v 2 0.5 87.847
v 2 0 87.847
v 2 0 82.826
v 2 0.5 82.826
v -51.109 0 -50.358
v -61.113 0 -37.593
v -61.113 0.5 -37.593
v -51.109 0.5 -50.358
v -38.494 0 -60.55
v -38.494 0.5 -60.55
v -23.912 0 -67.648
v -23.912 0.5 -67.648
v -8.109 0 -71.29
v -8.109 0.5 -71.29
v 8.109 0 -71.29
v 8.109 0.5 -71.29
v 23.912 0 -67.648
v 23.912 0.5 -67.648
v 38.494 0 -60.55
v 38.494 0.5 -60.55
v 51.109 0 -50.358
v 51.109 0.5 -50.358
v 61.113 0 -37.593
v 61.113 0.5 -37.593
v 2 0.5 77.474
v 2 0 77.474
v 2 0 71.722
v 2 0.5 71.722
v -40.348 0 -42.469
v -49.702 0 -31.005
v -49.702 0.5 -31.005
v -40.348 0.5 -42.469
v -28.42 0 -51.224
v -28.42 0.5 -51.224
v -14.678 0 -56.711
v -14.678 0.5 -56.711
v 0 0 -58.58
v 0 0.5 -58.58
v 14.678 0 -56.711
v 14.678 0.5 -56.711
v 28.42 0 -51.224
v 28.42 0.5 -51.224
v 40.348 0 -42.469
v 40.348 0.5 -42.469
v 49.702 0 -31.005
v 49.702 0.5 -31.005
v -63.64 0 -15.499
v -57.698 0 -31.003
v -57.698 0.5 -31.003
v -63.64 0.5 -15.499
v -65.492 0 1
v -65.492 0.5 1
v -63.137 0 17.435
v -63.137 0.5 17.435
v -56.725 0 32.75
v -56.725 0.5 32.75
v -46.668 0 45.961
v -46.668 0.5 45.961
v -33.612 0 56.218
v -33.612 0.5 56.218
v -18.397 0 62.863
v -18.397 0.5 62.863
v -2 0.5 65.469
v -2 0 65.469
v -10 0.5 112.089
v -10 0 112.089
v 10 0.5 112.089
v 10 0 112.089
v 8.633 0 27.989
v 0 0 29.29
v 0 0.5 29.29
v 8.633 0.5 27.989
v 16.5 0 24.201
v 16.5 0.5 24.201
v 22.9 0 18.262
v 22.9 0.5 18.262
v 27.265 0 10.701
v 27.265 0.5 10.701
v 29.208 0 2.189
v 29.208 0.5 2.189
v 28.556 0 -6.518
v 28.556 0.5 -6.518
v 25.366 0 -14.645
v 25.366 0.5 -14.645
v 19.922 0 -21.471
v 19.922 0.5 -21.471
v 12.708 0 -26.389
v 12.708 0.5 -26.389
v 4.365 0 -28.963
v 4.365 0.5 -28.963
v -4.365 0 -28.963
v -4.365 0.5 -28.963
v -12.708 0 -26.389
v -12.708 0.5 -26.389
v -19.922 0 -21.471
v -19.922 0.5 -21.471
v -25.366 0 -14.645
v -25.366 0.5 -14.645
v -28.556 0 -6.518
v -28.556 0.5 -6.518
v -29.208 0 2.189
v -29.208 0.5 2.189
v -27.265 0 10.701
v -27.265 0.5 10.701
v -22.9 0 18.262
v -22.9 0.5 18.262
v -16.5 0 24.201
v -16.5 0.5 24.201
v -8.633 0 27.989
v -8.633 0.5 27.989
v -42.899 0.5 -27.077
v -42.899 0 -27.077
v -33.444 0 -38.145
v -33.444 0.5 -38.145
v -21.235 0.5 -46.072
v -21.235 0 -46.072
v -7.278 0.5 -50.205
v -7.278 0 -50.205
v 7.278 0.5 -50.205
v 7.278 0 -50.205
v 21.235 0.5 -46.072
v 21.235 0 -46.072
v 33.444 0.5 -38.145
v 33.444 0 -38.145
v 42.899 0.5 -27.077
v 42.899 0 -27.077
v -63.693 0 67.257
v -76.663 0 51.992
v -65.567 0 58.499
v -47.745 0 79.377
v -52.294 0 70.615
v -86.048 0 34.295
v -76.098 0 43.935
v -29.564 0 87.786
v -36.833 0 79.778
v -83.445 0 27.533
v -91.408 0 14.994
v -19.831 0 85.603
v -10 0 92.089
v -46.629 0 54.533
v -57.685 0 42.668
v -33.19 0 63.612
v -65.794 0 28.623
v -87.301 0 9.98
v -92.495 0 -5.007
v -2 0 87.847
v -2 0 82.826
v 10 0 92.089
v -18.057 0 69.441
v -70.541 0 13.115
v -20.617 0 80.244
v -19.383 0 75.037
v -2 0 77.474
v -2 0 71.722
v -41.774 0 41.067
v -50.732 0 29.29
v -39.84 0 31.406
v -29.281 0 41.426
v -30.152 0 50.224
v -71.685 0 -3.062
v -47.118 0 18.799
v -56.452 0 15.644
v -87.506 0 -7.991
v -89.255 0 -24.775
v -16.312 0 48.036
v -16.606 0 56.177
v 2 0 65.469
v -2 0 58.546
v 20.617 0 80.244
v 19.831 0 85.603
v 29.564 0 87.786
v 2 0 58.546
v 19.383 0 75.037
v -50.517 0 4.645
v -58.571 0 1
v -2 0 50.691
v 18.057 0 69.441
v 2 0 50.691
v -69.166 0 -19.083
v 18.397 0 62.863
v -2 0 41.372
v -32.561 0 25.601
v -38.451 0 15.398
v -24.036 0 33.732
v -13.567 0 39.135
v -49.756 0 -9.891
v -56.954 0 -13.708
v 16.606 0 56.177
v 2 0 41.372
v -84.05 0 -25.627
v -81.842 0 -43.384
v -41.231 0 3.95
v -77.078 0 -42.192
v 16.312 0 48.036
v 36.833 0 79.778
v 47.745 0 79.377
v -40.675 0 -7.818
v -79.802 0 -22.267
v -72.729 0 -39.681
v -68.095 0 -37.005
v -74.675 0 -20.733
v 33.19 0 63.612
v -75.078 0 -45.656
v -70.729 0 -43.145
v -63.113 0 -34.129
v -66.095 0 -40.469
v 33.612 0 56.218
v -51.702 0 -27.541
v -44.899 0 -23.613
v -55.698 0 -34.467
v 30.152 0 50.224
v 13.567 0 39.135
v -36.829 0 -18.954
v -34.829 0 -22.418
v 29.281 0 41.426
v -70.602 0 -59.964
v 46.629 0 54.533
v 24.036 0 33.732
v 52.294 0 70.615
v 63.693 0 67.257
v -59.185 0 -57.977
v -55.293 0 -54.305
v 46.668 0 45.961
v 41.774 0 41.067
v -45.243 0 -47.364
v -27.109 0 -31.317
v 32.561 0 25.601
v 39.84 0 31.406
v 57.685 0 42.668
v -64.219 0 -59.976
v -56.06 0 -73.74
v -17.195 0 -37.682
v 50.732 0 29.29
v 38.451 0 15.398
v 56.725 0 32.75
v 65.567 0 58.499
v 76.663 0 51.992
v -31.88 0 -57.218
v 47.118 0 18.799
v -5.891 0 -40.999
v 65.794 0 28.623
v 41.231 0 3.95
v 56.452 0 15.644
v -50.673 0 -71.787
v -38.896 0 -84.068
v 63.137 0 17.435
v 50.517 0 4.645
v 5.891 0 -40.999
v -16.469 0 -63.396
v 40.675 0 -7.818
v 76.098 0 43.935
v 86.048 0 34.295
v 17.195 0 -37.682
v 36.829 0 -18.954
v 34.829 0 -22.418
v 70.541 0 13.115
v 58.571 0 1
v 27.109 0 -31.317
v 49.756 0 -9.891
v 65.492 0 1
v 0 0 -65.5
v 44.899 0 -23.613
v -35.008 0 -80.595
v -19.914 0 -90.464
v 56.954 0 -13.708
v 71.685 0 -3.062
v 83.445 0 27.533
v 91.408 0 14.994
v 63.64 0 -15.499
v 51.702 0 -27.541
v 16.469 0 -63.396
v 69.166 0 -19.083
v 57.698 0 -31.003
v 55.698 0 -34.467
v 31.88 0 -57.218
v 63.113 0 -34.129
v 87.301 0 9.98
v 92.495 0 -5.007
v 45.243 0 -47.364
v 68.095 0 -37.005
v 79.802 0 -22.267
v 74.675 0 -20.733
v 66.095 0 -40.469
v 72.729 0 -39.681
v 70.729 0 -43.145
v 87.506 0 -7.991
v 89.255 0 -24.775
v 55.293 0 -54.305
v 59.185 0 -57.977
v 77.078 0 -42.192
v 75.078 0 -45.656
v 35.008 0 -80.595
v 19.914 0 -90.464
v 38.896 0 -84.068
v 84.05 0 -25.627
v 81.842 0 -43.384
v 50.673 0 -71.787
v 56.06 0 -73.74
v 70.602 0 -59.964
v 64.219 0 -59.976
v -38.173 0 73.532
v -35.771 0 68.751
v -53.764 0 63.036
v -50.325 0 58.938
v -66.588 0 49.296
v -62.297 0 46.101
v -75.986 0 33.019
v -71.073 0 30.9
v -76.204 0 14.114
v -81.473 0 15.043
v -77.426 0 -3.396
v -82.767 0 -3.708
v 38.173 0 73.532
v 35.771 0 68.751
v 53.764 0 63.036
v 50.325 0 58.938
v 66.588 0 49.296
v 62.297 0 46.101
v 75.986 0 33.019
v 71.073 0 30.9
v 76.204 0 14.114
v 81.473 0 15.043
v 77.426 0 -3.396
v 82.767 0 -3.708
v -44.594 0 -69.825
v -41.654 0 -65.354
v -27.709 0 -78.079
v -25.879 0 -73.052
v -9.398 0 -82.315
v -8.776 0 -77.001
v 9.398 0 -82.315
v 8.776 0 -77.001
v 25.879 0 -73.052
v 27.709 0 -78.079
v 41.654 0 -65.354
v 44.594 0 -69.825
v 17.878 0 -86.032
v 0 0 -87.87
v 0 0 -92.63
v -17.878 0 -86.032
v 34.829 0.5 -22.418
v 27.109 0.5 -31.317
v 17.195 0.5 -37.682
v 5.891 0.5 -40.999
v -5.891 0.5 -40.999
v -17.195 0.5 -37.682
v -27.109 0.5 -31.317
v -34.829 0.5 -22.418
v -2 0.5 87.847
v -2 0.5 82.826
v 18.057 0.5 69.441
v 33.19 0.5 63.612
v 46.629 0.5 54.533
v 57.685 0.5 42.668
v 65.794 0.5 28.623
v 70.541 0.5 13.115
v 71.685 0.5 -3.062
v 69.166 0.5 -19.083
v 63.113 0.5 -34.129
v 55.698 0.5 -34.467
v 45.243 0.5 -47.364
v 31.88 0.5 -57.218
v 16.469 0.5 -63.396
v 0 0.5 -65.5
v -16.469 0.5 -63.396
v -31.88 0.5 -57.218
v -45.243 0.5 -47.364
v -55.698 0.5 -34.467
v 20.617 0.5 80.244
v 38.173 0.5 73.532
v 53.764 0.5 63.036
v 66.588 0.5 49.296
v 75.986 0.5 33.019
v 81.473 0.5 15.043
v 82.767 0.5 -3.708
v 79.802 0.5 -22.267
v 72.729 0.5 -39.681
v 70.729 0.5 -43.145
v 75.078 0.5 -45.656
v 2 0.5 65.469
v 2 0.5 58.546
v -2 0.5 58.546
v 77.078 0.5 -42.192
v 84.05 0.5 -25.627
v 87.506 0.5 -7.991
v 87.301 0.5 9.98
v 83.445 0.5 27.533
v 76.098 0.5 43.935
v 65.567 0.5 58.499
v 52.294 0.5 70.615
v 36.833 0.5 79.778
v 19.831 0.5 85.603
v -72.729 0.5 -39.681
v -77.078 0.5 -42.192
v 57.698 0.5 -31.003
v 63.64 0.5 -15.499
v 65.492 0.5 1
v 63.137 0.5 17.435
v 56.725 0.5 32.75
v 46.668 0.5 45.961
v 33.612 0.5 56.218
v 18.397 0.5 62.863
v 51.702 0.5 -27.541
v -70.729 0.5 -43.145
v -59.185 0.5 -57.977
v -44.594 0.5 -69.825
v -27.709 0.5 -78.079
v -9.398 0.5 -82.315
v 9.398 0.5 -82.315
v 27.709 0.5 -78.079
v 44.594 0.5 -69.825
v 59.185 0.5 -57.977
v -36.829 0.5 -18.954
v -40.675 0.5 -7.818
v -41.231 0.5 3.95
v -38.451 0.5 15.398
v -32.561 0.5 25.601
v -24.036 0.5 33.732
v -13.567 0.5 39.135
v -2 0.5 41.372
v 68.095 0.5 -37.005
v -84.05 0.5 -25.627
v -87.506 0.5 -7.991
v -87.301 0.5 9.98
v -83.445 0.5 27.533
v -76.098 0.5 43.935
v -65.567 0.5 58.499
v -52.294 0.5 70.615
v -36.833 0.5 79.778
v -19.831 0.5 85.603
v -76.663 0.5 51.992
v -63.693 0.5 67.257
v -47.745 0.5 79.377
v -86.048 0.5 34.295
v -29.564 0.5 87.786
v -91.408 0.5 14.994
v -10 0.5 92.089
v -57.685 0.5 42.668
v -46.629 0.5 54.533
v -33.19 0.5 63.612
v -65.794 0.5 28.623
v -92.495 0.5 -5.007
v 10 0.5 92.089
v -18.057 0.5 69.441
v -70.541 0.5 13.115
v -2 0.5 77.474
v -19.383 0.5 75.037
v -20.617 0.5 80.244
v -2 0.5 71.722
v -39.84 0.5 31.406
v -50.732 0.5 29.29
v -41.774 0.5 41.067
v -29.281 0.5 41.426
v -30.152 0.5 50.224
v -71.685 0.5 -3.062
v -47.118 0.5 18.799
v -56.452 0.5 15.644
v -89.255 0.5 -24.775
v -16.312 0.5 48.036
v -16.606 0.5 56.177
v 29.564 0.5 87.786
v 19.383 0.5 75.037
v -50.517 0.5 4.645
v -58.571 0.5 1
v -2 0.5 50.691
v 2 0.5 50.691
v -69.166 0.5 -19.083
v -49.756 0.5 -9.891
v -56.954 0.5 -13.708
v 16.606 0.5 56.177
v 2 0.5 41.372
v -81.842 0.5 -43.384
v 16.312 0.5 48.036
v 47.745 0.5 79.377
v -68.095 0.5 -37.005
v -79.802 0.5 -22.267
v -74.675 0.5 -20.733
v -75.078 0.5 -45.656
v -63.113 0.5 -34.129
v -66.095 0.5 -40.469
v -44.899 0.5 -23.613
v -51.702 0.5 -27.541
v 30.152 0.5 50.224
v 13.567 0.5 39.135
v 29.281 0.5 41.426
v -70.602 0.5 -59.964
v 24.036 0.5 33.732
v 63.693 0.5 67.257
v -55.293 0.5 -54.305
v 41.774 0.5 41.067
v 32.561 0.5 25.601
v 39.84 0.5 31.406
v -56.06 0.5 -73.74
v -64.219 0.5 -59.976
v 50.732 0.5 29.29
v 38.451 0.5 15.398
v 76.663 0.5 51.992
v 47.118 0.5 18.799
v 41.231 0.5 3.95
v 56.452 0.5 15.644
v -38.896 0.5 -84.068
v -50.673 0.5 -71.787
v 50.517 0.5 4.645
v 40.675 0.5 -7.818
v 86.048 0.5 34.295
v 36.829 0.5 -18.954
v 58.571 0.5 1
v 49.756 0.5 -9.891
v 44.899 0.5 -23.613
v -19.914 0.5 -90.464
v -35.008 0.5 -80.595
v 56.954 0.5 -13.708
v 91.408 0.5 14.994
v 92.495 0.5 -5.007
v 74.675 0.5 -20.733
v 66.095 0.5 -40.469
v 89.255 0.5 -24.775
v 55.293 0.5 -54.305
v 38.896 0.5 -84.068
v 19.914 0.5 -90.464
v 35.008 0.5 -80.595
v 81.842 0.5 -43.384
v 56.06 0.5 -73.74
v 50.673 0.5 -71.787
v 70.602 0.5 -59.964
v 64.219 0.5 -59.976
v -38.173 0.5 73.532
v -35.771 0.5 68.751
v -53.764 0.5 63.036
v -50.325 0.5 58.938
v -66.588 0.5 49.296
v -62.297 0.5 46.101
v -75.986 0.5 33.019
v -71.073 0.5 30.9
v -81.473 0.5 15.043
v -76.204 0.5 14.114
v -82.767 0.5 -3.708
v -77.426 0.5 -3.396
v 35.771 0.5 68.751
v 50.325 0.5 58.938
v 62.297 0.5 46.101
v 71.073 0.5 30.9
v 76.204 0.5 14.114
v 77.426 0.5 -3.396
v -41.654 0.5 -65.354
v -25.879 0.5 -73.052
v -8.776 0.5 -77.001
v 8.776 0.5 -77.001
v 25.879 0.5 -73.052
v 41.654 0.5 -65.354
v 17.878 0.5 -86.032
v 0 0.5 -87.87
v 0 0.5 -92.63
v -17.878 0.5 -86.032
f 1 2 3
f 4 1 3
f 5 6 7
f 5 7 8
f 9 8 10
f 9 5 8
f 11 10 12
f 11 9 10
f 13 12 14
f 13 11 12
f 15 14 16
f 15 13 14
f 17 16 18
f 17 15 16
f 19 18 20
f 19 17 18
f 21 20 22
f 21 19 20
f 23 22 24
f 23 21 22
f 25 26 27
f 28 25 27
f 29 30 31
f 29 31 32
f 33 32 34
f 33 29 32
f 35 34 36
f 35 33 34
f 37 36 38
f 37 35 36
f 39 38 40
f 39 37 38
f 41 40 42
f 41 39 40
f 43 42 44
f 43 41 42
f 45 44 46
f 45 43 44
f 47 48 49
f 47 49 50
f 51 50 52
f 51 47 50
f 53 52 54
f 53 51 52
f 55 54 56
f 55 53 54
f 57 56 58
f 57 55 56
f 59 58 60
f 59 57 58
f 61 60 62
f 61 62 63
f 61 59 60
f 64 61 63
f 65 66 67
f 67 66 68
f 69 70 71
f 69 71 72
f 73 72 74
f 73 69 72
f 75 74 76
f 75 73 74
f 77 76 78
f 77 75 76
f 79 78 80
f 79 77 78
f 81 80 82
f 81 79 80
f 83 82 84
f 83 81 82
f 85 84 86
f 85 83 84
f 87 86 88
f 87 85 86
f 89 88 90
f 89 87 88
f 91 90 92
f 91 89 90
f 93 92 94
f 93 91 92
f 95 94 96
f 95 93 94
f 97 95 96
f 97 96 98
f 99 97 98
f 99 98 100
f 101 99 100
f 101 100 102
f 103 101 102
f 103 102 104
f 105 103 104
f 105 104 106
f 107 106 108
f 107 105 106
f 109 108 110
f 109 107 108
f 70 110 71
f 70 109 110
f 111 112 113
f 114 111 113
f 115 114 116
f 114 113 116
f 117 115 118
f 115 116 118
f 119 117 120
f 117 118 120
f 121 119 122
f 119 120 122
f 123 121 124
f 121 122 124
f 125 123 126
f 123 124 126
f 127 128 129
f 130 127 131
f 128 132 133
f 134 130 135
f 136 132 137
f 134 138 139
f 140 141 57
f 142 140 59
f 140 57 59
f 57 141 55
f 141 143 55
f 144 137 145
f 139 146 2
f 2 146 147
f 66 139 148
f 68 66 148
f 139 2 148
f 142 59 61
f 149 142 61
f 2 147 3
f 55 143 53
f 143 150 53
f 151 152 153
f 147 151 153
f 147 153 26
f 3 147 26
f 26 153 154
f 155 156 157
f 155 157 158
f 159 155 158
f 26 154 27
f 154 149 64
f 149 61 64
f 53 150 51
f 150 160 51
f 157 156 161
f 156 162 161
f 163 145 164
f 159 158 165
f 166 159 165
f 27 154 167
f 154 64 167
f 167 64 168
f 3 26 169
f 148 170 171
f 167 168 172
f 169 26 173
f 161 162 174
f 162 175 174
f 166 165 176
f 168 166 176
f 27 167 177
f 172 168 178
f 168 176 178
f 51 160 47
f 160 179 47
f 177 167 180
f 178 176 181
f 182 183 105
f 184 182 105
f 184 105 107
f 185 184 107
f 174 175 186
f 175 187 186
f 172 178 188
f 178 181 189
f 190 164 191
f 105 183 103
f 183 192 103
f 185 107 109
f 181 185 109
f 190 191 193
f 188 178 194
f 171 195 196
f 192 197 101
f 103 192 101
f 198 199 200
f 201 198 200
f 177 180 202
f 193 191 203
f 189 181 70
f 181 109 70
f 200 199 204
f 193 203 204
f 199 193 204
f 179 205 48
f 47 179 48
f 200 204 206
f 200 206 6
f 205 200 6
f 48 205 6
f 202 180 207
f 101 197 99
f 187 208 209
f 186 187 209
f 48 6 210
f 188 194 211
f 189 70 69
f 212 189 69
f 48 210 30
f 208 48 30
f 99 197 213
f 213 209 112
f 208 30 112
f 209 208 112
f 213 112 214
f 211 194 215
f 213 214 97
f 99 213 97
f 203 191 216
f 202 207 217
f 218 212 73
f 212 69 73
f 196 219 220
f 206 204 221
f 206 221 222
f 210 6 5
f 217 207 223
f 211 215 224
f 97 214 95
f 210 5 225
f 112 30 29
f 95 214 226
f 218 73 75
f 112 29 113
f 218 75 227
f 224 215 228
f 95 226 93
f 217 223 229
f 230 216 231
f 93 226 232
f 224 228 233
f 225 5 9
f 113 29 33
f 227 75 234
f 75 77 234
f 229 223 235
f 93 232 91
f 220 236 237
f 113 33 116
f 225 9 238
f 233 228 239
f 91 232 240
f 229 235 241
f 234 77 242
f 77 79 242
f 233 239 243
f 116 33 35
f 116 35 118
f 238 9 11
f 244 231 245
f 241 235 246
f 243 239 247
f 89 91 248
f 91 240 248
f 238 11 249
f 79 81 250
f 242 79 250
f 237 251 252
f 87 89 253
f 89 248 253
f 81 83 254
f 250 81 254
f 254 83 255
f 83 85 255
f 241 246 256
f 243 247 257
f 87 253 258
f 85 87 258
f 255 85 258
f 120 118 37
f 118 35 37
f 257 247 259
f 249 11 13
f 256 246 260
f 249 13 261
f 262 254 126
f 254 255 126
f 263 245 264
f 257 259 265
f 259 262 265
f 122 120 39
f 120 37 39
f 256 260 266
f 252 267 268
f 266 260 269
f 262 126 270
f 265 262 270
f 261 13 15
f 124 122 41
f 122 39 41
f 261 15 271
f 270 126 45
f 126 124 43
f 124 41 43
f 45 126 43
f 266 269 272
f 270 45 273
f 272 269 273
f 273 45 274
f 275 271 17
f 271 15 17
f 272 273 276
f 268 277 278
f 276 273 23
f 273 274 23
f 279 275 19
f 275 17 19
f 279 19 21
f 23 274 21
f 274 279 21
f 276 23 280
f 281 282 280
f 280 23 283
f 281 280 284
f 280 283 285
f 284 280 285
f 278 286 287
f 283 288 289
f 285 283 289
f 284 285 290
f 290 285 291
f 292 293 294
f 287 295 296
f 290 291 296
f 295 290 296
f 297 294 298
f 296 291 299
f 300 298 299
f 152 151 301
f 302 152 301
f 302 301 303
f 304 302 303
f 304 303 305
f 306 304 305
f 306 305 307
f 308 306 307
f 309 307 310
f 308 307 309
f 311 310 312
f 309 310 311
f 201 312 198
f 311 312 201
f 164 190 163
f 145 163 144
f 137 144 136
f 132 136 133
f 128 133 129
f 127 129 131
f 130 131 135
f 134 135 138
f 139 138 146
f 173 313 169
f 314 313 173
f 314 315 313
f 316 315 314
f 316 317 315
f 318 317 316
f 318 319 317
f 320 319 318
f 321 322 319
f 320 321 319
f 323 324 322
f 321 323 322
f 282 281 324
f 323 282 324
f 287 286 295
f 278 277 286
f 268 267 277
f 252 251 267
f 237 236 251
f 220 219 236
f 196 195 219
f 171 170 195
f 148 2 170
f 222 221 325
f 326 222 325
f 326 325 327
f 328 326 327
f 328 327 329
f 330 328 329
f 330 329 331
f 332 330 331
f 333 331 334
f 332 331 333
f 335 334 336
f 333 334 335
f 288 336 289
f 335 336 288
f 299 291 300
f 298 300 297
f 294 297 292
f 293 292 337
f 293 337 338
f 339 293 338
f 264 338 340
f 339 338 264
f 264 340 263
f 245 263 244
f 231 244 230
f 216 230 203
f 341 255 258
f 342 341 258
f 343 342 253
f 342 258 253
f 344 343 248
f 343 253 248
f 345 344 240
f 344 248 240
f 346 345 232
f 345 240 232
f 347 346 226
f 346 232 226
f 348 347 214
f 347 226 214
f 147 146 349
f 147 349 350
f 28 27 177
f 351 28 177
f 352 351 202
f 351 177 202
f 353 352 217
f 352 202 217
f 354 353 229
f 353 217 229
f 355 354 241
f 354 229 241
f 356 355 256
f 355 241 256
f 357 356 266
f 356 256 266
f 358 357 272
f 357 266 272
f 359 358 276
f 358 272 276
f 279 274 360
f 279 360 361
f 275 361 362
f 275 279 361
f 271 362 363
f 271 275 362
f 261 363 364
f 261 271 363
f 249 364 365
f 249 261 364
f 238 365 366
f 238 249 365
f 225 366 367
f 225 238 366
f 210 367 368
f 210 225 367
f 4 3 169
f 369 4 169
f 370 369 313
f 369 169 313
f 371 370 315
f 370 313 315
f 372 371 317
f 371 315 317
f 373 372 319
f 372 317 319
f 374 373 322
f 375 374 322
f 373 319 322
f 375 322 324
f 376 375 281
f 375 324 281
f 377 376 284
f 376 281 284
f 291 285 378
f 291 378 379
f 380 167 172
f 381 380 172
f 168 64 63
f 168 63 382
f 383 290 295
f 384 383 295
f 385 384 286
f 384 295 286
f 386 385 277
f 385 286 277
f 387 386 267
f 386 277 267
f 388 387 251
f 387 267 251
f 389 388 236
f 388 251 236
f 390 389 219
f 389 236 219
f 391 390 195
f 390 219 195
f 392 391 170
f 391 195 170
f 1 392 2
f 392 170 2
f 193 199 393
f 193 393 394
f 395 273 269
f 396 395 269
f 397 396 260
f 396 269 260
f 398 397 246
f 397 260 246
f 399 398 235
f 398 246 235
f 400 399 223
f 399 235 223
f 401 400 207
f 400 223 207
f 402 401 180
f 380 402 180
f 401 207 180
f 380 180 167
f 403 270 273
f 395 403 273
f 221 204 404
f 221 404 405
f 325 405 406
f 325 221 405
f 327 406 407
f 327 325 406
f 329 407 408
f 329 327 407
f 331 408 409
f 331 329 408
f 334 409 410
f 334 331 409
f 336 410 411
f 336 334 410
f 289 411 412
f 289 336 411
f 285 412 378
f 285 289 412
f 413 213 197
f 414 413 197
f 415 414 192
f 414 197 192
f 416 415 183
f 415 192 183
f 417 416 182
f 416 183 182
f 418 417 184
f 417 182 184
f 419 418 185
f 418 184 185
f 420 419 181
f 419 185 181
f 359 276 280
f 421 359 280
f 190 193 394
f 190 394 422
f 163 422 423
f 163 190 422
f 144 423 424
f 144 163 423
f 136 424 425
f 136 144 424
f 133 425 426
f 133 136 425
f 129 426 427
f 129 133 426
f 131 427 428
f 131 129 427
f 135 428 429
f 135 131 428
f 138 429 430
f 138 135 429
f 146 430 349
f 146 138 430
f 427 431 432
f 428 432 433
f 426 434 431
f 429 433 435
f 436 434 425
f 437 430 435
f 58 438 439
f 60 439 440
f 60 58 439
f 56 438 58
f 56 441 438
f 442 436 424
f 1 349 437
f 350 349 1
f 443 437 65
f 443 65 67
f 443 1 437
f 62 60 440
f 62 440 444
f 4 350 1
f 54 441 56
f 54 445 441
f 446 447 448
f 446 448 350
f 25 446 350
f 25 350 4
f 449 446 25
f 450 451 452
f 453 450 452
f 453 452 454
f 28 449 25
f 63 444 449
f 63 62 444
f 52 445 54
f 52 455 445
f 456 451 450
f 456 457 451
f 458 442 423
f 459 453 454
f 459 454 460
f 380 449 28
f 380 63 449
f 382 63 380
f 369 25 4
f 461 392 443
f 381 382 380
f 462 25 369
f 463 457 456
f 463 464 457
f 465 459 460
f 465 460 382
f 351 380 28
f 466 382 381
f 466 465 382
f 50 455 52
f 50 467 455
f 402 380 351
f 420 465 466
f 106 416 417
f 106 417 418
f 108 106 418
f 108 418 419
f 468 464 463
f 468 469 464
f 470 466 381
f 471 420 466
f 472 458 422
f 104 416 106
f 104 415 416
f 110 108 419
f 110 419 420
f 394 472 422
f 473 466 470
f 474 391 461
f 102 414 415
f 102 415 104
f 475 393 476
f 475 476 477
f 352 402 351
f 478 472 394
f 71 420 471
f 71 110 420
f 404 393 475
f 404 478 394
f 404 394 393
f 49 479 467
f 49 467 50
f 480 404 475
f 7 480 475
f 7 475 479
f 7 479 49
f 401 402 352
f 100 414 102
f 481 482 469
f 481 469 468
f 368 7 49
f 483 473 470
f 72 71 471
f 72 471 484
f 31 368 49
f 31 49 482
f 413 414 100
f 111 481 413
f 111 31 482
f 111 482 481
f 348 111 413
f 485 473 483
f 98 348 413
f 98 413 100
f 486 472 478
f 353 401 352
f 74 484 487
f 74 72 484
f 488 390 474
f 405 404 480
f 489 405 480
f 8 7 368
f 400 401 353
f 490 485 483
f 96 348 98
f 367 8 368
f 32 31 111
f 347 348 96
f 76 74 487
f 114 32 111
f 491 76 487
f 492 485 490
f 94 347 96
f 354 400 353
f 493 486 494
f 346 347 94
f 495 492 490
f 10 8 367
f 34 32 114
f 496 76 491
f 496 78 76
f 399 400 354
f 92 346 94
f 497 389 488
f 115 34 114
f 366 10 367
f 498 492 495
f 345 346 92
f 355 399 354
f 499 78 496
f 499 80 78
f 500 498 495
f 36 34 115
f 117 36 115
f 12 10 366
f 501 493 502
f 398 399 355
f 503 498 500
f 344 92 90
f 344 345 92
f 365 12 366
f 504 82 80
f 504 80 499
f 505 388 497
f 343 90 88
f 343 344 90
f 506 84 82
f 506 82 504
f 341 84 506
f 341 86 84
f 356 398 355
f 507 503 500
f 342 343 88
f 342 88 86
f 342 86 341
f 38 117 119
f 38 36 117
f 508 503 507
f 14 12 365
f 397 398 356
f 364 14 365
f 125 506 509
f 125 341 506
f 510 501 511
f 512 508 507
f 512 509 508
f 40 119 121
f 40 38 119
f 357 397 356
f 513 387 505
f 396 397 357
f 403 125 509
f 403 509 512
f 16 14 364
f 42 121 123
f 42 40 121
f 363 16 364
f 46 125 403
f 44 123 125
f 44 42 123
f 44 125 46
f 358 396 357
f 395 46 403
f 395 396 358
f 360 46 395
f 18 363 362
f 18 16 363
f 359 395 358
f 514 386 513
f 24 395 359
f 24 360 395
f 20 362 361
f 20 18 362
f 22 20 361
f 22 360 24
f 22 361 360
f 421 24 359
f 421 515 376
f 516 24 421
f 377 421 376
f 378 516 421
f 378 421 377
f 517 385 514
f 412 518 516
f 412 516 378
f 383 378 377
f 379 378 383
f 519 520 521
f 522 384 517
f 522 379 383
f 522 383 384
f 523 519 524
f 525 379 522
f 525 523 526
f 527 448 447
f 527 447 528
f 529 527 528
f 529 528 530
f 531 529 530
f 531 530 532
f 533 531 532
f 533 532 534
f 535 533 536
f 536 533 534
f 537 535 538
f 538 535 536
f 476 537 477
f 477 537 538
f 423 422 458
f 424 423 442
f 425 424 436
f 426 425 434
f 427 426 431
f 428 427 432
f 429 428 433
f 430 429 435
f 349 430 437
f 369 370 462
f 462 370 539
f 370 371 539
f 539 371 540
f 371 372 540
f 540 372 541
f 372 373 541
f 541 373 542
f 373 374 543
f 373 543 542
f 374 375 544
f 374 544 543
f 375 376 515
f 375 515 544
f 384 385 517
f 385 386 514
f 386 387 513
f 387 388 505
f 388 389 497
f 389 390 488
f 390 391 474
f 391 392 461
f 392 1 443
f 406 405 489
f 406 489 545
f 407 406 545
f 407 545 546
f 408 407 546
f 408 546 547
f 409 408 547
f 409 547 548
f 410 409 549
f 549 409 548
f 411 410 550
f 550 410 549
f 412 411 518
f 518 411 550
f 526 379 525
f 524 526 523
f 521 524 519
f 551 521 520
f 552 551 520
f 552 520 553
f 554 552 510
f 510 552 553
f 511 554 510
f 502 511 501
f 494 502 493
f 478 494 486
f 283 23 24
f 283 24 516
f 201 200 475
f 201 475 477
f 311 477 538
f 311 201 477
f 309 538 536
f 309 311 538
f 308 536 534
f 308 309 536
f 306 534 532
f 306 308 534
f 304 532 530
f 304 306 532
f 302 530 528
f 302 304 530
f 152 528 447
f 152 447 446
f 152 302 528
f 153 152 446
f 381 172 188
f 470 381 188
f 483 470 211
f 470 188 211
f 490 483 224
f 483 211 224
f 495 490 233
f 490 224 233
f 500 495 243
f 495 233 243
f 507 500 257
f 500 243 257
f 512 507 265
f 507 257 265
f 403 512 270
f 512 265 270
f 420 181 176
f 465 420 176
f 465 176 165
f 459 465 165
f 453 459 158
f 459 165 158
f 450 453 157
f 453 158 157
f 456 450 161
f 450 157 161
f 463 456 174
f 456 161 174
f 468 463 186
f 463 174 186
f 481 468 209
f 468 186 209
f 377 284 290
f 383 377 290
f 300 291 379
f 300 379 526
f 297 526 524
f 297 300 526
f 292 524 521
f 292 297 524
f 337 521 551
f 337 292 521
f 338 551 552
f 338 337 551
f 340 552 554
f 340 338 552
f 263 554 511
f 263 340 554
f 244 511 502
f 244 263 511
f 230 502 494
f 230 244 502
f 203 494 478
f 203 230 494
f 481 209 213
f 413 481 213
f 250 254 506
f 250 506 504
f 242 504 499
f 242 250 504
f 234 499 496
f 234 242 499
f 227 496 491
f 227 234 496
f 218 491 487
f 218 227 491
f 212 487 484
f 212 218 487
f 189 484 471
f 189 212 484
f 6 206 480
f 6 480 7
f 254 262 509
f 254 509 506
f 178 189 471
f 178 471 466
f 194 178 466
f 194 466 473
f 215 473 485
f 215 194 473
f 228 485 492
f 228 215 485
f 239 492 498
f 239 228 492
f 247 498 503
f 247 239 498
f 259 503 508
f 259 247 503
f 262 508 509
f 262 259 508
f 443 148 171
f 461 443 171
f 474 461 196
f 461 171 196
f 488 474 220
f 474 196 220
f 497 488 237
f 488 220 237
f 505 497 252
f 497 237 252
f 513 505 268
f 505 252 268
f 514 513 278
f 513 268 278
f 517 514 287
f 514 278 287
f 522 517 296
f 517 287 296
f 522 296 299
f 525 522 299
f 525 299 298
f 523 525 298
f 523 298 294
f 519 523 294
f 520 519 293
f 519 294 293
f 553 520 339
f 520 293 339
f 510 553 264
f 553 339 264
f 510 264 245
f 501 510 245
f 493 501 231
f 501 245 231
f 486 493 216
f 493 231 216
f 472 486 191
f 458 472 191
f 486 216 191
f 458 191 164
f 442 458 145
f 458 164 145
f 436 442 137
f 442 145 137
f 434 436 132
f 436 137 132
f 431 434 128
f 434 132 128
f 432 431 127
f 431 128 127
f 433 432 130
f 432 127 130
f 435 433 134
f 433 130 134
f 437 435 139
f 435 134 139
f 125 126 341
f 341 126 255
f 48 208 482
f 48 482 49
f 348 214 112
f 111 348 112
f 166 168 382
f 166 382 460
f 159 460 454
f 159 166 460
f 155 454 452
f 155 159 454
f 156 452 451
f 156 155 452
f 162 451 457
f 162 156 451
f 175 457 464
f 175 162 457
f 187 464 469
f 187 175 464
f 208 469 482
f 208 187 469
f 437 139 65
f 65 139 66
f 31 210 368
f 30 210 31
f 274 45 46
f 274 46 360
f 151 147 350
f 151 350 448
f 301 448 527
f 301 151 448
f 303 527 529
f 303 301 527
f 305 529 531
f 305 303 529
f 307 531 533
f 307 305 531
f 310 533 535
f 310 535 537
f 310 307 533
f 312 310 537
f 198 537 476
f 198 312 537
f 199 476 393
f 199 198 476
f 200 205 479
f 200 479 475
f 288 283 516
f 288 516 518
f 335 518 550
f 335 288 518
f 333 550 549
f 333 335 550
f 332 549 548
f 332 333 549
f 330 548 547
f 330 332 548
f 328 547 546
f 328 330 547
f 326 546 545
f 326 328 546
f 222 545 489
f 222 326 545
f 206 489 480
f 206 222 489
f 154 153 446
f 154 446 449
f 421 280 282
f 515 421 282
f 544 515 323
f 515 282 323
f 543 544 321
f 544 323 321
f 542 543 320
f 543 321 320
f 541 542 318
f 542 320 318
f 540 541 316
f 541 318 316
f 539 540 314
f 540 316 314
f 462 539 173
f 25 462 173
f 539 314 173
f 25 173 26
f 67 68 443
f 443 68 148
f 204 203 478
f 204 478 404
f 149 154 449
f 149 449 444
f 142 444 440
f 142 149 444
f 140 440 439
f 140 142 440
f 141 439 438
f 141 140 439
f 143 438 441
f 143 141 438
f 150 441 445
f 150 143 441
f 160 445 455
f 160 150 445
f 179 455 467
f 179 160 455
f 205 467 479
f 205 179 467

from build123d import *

# Parameters (mm, degrees)
SKETCH_1_R      = 29.29
EXTRUDE_1_DEPTH = 0.5


with BuildPart() as part:
    # 草图1 → 凸台-拉伸1 (new body)
    with BuildSketch(Plane(origin=(0, 0, 0), x_dir=(1, 0, 0), z_dir=(0, 1, 0))):
        with BuildLine():
            Line((-10, -92.088636107), (-10, -112.088636107))
            Line((-10, -112.088636107), (10, -112.088636107))
            Line((10, -112.088636107), (10, -92.088636107))
            ThreePointArc((10, -92.088636107), (0, 92.63), (-10, -92.088636107))
        make_face()
        with Locations(Location((0, 0, 0), (0, 0, 270))):
            Circle(SKETCH_1_R, mode=Mode.SUBTRACT)
        with BuildLine():
            Line((-2, -41.37168597), (-2, -50.690560265))
            ThreePointArc((-2, -50.690560265), (-43.933468734, -25.365), (-44.899312922, 23.613229325))
            Line((-44.899312922, 23.613229325), (-36.828931047, 18.953792177))
            ThreePointArc((-36.828931047, 18.953792177), (-35.870772225, -20.71), (-2, -41.37168597))
        make_face(mode=Mode.SUBTRACT)
        with BuildLine():
            Line((2, -41.37168597), (2, -50.690560265))
            ThreePointArc((2, -50.690560265), (43.933468734, -25.365), (44.899312922, 23.613229325))
            Line((44.899312922, 23.613229325), (36.828931047, 18.953792177))
            ThreePointArc((36.828931047, 18.953792177), (35.870772225, -20.71), (2, -41.37168597))
        make_face(mode=Mode.SUBTRACT)
        with BuildLine():
            Line((-34.828931047, 22.417893793), (-42.899312922, 27.07733094))
            ThreePointArc((-42.899312922, 27.07733094), (0, 50.73), (42.899312922, 27.07733094))
            Line((42.899312922, 27.07733094), (34.828931047, 22.417893793))
            ThreePointArc((34.828931047, 22.417893793), (0, 41.42), (-34.828931047, 22.417893793))
        make_face(mode=Mode.SUBTRACT)
        with BuildLine():
            Line((51.70219226, 27.540873542), (57.698214258, 31.002678457))
            ThreePointArc((57.698214258, 31.002678457), (56.724663948, -32.75), (2, -65.469458528))
            Line((2, -65.469458528), (2, -58.5458487))
            ThreePointArc((2, -58.5458487), (50.731768154, -29.29), (51.70219226, 27.540873542))
        make_face(mode=Mode.SUBTRACT)
        with BuildLine():
            Line((49.70219226, 31.004975158), (55.698214258, 34.466780072))
            ThreePointArc((55.698214258, 34.466780072), (0, 65.5), (-55.698214258, 34.466780072))
            Line((-55.698214258, 34.466780072), (-49.70219226, 31.004975158))
            ThreePointArc((-49.70219226, 31.004975158), (0, 58.58), (49.70219226, 31.004975158))
        make_face(mode=Mode.SUBTRACT)
        with BuildLine():
            Line((63.11317795, 34.129009202), (68.094616028, 37.005043818))
            ThreePointArc((68.094616028, 37.005043818), (67.116968793, -38.75), (2, -77.47418925))
            Line((2, -77.47418925), (2, -71.722120019))
            ThreePointArc((2, -71.722120019), (62.137322722, -35.875), (63.11317795, 34.129009202))
        make_face(mode=Mode.SUBTRACT)
        with BuildLine():
            Line((61.11317795, 37.593110817), (66.094616028, 40.469145433))
            ThreePointArc((66.094616028, 40.469145433), (0, 77.5), (-66.094616028, 40.469145433))
            Line((-66.094616028, 40.469145433), (-61.11317795, 37.593110817))
            ThreePointArc((-61.11317795, 37.593110817), (0, 71.75), (61.11317795, 37.593110817))
        make_face(mode=Mode.SUBTRACT)
        with BuildLine():
            Line((72.729295793, 39.680877427), (77.077938162, 42.19156727))
            ThreePointArc((77.077938162, 42.19156727), (76.097652231, -43.935), (2, -87.847236155))
            Line((2, -87.847236155), (2, -82.82585647))
            ThreePointArc((2, -82.82585647), (71.750204704, -41.425), (72.729295793, 39.680877427))
        make_face(mode=Mode.SUBTRACT)
        with BuildLine():
            Line((70.729295793, 43.144979043), (75.077938162, 45.655668885))
            ThreePointArc((75.077938162, 45.655668885), (0, 87.87), (-75.077938162, 45.655668885))
            Line((-75.077938162, 45.655668885), (-70.729295793, 43.144979043))
            ThreePointArc((-70.729295793, 43.144979043), (0, 82.85), (70.729295793, 43.144979043))
        make_face(mode=Mode.SUBTRACT)
        with BuildLine():
            Line((-51.70219226, 27.540873542), (-57.698214258, 31.002678457))
            ThreePointArc((-57.698214258, 31.002678457), (-56.724663948, -32.75), (-2, -65.469458528))
            Line((-2, -65.469458528), (-2, -58.5458487))
            ThreePointArc((-2, -58.5458487), (-50.731768154, -29.29), (-51.70219226, 27.540873542))
        make_face(mode=Mode.SUBTRACT)
        with BuildLine():
            Line((-63.11317795, 34.129009202), (-68.094616028, 37.005043818))
            ThreePointArc((-68.094616028, 37.005043818), (-67.116968793, -38.75), (-2, -77.47418925))
            Line((-2, -77.47418925), (-2, -71.722120019))
            ThreePointArc((-2, -71.722120019), (-62.137322722, -35.875), (-63.11317795, 34.129009202))
        make_face(mode=Mode.SUBTRACT)
        with BuildLine():
            Line((-72.729295793, 39.680877427), (-77.077938162, 42.19156727))
            ThreePointArc((-77.077938162, 42.19156727), (-76.097652231, -43.935), (-2, -87.847236155))
            Line((-2, -87.847236155), (-2, -82.82585647))
            ThreePointArc((-2, -82.82585647), (-71.750204704, -41.425), (-72.729295793, 39.680877427))
        make_face(mode=Mode.SUBTRACT)
    extrude(amount=EXTRUDE_1_DEPTH)


solid = part.part
